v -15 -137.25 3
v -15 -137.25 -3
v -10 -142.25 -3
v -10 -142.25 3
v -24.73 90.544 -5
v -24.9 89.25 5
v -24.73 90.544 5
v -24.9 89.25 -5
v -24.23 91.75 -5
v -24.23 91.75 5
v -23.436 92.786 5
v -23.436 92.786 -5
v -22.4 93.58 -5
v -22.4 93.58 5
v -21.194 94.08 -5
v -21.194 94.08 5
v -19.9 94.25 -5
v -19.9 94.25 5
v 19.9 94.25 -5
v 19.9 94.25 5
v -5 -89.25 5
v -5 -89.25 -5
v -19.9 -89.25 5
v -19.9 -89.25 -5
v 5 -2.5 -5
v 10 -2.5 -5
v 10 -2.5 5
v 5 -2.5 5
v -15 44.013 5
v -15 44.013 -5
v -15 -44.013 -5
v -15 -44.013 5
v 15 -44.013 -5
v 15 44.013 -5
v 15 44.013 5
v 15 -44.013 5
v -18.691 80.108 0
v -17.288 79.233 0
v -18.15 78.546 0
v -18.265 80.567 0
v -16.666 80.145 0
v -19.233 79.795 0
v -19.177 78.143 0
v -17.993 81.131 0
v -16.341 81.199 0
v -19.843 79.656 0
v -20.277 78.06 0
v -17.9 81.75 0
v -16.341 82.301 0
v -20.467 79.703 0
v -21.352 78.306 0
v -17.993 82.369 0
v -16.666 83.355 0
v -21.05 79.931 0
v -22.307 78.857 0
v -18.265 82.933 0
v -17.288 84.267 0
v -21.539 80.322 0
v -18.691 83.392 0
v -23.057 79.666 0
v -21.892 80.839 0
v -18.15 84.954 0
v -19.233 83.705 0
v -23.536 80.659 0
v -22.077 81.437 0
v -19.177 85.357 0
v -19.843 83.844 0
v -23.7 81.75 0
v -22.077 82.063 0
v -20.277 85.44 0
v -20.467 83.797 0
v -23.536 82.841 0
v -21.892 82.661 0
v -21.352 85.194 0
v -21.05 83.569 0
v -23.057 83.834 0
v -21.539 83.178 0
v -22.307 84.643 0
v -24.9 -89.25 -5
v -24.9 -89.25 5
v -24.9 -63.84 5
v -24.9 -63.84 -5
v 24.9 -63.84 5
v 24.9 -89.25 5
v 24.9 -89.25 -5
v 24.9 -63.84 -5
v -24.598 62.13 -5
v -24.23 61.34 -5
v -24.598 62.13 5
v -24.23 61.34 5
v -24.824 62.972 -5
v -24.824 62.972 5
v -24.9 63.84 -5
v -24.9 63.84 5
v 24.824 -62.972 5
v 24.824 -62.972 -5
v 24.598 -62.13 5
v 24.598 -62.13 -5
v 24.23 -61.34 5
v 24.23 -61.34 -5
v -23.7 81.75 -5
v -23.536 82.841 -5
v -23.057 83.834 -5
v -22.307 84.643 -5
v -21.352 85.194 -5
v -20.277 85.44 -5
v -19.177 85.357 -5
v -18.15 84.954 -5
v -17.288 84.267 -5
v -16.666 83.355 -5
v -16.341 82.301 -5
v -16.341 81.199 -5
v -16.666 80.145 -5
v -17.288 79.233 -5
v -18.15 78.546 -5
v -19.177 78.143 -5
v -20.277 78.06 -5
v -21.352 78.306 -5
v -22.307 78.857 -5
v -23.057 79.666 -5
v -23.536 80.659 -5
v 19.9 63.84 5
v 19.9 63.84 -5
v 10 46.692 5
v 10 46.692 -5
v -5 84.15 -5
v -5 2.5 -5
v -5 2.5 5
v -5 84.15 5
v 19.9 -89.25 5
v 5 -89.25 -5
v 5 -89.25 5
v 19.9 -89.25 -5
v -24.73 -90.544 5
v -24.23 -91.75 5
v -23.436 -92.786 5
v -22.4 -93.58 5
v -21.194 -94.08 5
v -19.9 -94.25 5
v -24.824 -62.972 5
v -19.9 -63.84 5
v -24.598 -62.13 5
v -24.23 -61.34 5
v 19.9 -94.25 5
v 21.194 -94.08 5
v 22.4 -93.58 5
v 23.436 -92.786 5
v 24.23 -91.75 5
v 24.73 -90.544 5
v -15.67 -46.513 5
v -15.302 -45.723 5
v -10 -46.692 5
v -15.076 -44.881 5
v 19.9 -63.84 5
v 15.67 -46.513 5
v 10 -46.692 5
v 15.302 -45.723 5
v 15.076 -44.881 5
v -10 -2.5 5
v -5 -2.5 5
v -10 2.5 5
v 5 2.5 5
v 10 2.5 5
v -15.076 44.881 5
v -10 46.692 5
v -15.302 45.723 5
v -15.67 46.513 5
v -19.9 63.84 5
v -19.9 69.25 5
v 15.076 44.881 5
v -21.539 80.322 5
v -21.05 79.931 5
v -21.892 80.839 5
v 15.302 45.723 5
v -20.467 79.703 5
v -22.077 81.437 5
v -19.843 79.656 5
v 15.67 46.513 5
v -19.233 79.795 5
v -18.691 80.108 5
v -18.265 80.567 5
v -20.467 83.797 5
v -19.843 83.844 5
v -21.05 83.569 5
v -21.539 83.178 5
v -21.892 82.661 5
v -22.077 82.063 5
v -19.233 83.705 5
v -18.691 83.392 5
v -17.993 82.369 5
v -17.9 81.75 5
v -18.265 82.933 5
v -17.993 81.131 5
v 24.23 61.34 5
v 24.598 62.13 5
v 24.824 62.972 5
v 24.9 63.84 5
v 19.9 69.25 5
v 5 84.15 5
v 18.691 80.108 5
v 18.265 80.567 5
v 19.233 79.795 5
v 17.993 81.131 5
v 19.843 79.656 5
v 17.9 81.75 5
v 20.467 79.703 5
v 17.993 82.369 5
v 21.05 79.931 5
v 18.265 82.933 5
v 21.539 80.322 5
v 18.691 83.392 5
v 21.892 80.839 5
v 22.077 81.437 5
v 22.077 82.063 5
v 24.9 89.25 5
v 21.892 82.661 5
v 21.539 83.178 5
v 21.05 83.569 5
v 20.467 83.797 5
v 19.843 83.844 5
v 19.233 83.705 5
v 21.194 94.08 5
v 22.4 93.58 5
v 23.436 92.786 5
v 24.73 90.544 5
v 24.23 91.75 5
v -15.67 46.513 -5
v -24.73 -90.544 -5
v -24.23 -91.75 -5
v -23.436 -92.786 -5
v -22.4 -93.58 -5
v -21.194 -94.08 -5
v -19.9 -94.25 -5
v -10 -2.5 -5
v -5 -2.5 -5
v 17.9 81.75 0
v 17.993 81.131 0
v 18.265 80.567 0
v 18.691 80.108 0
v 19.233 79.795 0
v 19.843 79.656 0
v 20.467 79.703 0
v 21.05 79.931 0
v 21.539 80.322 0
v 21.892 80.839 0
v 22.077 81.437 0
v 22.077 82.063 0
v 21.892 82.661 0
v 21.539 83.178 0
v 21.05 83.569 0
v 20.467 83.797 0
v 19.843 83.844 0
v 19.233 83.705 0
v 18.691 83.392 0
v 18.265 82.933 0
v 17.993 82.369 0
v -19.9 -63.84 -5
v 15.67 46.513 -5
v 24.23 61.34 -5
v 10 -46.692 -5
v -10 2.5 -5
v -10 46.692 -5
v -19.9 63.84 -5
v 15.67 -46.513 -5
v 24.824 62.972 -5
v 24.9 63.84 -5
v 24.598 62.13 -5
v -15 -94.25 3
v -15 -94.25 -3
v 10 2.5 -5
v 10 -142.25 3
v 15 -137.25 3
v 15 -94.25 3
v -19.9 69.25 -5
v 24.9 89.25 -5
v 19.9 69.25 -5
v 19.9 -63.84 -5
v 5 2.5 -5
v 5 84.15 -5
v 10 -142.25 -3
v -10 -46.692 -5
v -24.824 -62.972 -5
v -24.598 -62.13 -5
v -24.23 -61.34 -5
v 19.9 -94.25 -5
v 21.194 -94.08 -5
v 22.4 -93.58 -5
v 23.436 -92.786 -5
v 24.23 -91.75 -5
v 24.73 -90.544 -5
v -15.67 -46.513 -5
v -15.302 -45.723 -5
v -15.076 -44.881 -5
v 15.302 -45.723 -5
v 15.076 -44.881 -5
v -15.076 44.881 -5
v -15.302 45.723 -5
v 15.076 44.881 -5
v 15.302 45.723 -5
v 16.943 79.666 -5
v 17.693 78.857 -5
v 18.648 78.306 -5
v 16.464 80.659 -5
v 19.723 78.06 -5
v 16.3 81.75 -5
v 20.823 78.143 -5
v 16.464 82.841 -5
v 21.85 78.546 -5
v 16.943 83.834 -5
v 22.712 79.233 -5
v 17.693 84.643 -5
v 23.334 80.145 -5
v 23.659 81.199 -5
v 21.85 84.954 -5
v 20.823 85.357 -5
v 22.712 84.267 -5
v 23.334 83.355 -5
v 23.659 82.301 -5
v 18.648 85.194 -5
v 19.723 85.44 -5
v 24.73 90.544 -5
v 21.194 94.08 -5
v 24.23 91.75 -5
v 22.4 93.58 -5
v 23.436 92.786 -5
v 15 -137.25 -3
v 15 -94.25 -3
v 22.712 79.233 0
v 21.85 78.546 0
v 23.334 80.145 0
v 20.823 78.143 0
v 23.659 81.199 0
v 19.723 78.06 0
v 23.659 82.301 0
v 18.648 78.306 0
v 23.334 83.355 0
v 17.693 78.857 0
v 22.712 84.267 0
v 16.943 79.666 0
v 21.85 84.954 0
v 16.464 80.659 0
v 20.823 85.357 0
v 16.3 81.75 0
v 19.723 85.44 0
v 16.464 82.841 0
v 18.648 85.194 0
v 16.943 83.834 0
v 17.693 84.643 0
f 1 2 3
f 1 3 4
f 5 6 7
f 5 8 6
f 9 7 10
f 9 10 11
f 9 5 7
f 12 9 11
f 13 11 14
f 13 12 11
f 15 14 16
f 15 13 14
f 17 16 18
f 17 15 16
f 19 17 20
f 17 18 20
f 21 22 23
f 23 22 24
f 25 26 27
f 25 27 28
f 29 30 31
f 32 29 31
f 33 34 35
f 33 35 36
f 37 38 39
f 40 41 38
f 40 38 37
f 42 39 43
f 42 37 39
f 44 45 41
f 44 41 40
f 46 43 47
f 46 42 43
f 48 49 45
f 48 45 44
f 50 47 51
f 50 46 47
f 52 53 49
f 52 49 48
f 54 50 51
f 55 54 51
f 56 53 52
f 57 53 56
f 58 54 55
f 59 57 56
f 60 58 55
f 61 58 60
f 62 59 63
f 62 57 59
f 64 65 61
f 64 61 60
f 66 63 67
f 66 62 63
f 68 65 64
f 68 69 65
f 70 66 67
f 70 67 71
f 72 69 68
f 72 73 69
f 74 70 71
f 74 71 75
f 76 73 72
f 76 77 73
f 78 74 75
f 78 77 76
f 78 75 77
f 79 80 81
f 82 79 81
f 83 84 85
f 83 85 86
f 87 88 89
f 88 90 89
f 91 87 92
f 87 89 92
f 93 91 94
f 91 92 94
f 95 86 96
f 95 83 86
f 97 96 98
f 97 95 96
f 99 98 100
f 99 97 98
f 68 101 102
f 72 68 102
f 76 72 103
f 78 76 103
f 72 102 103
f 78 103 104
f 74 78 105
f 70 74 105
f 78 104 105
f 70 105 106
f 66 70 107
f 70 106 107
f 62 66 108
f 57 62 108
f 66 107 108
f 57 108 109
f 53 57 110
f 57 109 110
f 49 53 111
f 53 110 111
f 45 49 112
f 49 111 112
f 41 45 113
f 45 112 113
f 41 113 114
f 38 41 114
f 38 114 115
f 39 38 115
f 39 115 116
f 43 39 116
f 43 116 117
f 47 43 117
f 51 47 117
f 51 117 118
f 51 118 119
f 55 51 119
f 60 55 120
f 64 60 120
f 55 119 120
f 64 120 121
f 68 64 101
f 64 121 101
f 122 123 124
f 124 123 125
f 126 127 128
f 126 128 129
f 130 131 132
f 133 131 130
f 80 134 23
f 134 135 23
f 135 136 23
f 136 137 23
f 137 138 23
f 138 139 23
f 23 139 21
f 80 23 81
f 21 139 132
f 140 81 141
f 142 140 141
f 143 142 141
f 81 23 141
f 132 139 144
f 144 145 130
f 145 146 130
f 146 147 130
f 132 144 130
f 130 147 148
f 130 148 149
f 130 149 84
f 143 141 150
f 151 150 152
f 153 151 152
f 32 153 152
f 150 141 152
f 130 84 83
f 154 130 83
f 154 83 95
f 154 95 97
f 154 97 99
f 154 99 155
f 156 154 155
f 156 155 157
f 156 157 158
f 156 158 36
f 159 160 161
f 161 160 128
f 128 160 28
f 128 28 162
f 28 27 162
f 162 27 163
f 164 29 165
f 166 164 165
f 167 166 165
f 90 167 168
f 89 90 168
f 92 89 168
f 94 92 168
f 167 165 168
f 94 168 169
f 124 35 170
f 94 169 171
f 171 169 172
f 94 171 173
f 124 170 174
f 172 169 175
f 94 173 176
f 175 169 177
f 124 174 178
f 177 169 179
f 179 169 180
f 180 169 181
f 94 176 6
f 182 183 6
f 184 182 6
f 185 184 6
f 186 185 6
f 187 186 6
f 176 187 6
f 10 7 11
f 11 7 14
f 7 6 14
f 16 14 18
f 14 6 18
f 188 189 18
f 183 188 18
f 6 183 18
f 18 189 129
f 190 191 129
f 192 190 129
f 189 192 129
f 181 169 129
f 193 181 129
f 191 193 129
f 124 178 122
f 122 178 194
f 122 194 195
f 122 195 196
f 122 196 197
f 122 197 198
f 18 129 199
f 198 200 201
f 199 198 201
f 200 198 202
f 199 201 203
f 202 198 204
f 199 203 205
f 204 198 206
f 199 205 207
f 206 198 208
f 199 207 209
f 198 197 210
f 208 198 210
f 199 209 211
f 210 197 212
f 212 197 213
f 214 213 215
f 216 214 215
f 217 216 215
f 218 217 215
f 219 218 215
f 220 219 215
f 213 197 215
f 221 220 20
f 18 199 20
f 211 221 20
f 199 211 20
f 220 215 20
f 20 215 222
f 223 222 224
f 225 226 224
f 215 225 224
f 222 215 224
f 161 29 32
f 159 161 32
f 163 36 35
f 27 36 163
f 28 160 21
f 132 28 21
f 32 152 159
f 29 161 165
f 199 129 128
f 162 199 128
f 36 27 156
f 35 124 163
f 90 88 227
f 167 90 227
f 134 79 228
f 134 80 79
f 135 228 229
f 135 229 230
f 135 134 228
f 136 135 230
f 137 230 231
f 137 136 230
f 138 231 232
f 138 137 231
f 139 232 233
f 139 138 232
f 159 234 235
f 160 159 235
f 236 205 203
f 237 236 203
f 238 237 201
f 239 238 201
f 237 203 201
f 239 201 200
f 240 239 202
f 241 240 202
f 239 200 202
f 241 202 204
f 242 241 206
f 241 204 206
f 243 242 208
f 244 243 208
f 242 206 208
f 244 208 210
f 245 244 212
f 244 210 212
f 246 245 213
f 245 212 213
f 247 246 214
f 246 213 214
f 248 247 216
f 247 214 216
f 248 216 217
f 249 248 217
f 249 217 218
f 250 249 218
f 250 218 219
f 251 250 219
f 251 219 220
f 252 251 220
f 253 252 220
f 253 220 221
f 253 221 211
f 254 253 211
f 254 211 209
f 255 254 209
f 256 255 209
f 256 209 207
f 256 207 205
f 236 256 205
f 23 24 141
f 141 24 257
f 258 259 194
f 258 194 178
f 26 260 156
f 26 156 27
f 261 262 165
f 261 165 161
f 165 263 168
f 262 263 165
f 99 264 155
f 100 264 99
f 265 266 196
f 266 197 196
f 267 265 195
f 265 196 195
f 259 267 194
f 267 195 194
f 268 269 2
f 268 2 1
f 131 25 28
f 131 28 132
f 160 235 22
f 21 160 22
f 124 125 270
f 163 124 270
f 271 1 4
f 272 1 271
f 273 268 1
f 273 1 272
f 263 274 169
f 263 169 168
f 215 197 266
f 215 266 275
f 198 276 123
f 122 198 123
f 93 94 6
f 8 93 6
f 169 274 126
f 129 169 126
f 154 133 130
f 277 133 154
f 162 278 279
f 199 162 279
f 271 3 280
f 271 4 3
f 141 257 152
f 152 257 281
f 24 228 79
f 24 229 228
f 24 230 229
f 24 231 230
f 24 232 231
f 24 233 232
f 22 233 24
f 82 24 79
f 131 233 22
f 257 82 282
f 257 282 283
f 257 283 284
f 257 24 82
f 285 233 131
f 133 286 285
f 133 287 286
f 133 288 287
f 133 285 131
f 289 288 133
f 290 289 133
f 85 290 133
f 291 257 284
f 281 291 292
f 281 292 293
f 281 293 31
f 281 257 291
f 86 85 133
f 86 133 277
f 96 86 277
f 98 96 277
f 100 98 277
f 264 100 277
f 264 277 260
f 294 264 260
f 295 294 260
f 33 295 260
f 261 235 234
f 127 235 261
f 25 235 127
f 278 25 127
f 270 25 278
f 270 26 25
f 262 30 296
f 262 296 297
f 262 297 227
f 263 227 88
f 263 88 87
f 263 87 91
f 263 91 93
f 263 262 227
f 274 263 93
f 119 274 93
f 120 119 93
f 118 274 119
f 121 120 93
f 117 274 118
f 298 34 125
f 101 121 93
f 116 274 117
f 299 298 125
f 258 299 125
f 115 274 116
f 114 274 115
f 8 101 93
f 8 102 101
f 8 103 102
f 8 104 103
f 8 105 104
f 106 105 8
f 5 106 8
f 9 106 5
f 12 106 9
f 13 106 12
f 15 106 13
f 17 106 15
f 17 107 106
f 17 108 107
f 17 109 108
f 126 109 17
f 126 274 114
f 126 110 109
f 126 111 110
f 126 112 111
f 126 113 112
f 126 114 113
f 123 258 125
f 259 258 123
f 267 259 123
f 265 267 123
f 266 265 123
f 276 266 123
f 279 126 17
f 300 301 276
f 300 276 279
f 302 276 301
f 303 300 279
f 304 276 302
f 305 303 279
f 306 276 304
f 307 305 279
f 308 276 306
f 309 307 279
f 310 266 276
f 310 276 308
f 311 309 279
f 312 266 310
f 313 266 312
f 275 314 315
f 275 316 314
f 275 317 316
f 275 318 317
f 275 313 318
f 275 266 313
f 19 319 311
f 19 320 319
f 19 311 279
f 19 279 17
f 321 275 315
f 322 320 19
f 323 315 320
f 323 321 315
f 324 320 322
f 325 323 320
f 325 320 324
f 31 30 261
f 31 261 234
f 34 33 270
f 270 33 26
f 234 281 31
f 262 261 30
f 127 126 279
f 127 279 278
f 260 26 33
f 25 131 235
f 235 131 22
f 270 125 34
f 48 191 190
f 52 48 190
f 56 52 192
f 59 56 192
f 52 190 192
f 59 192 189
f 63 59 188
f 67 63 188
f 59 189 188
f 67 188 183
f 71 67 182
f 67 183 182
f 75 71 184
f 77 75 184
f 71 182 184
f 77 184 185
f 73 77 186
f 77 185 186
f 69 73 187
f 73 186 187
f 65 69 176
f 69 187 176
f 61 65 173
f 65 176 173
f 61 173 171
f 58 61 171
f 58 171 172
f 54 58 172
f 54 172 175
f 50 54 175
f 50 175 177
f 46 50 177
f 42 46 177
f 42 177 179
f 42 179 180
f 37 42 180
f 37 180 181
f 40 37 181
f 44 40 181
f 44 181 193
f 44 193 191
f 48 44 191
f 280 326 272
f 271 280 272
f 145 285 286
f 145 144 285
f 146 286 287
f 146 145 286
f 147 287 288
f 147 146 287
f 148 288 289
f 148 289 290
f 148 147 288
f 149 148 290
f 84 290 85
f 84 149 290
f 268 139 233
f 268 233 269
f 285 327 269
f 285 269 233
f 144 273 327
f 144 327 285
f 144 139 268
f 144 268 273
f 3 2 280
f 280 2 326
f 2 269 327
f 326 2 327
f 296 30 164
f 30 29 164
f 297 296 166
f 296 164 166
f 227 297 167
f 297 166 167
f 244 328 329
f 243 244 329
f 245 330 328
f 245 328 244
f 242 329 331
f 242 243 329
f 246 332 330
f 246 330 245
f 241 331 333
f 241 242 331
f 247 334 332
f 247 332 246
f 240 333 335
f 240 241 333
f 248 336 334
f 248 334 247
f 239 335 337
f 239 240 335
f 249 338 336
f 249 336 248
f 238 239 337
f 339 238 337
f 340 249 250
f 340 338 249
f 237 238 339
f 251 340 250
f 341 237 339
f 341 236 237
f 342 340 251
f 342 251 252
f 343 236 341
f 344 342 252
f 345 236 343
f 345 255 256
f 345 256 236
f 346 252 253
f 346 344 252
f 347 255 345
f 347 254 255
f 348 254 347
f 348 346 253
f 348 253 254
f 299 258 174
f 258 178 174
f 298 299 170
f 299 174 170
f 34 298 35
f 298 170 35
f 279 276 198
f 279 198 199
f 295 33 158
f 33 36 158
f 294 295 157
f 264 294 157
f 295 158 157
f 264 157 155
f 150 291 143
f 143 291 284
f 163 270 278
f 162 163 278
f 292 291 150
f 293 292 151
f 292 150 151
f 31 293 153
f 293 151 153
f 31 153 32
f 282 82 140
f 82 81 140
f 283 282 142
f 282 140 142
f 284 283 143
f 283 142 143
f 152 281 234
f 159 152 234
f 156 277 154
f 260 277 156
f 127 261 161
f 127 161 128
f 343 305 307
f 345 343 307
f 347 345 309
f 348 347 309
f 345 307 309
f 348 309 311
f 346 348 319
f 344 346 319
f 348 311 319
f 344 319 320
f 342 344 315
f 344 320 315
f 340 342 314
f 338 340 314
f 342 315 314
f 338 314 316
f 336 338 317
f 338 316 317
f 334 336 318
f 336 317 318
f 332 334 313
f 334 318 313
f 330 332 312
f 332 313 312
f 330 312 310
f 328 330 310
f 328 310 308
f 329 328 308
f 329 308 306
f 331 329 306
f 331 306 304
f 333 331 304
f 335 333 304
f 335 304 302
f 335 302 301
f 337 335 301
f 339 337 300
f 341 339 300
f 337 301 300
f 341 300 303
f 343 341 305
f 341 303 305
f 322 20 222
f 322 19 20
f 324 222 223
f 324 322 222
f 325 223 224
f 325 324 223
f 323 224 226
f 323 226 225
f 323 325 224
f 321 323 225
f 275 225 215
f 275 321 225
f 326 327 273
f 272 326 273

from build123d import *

# Parameters (mm, degrees)
SKETCH_1_W          = 49.8
SKETCH_1_H          = 188.5
EXTRUDE_1_DEPTH     = 5
CUT_EXTRUDE_1_DEPTH = 98.995267743
FILLET_1_R          = 5
CUT_EXTRUDE_2_DEPTH = 98.995267743
CHAMFER_2_SIZE      = 20
SKETCH_3_W          = 30
SKETCH_3_H          = 6
EXTRUDE_2_DEPTH     = 48
CHAMFER_3_SIZE      = 5
SKETCH_6_R          = 2.1
CUT_EXTRUDE_6_DEPTH = 145.758669861
SKETCH_7_R          = 3.7
CUT_EXTRUDE_7_DEPTH = 5


with BuildPart() as part:
    # 草图1 → 凸台-拉伸1 (new, symmetric)
    with BuildSketch(Plane.XY):
        Rectangle(SKETCH_1_W, SKETCH_1_H)
    extrude(amount=EXTRUDE_1_DEPTH, both=True)

    # 草图4 → 切除-拉伸1 (cut, through all)
    with BuildSketch(Plane(origin=(0, 0, -5), x_dir=(-1, 0, 0), z_dir=(0, 0, -1))):
        Polygon((-24.9, 62.5), (-15, 45.352697005), (-15, -45.352697005), (-24.9, -62.5), align=None)
        Polygon((24.9, -62.5), (24.9, 62.5), (15, 45.352697005), (15, -45.352697005), align=None)
    extrude(amount=-CUT_EXTRUDE_1_DEPTH, mode=Mode.SUBTRACT)

    # 圆角1
    fillet_1_edges = [part.edges().sort_by_distance(p)[0] for p in [
        (24.9, -62.5, 0),
        (24.9, 62.5, 0),
        (15, 45.352697005, 0),
        (15, -45.352697005, 0),
        (-24.9, -62.5, 0),
        (-15, -45.352697005, 0),
        (-15, 45.352697005, 0),
        (-24.9, 62.5, 0),
        (24.9, -94.25, 0),
        (-24.9, -94.25, 0),
        (-24.9, 94.25, 0),
        (24.9, 94.25, 0),
    ]]
    fillet(fillet_1_edges, radius=FILLET_1_R)

    # 草图5 → 切除-拉伸2 (cut, through all)
    with BuildSketch(Plane(origin=(0, 0, -5), x_dir=(-1, 0, 0), z_dir=(0, 0, -1))):
        Polygon((-19.9, 89.25), (-19.9, 63.839745962), (-10, 46.692442967), (-10, 2.5), (-5, 2.5), (-5, 89.25), align=None)
        Polygon((5, 89.25), (19.9, 89.25), (19.9, 63.839745962), (10, 46.692442967), (10, 2.5), (5, 2.5), align=None)
        Polygon((19.9, -89.25), (19.9, -63.839745962), (10, -46.692442967), (10, -2.5), (5, -2.5), (5, -89.25), align=None)
        Polygon((-5, -89.25), (-19.9, -89.25), (-19.9, -63.839745962), (-10, -46.692442967), (-10, -2.5), (-5, -2.5), align=None)
    extrude(amount=-CUT_EXTRUDE_2_DEPTH, mode=Mode.SUBTRACT)

    # 倒角2
    # the kernel refuses this chamfer: 20 mm, written as the material it adds along each edge
    with BuildSketch(Plane(origin=(-19.9, 89.25, -5), x_dir=(-0.027495876610586317, -0.9996219169112968, 0), z_dir=(0, 0, 1))) as chamfer_2_piece_1:
        Polygon((CHAMFER_2_SIZE * 0.999621916911, CHAMFER_2_SIZE * 0.0274958766106), (-CHAMFER_2_SIZE * 0.0274958766106, CHAMFER_2_SIZE * 0.999621916911), (0, 0), align=None)
    extrude(amount=10)
    with BuildSketch(Plane(origin=(19.9, 89.25, -5), x_dir=(0.027495876610586317, -0.9996219169112968, 0), z_dir=(0, 0, 1))) as chamfer_2_piece_2:
        Polygon((CHAMFER_2_SIZE * 0.999621916911, -CHAMFER_2_SIZE * 0.0274958766106), (-CHAMFER_2_SIZE * 0.0274958766106, -CHAMFER_2_SIZE * 0.999621916911), (0, 0), align=None)
    extrude(amount=10)

    # 草图3 → 凸台-拉伸2 (add)
    with BuildSketch(Plane.XZ.offset(94.25)):
        Rectangle(SKETCH_3_W, SKETCH_3_H)
    extrude(amount=EXTRUDE_2_DEPTH)

    # 倒角3
    chamfer_3_edges = [part.edges().sort_by_distance(p)[0] for p in [
        (15, -142.25, 0),
        (-15, -142.25, 0),
    ]]
    chamfer(chamfer_3_edges, length=CHAMFER_3_SIZE)

    # 草图6 → 切除-拉伸6 (cut, through all)
    with BuildSketch(Plane.XY.offset(5)):
        with Locations((-20, 81.75)):
            Circle(SKETCH_6_R)
        with Locations(Location((20, 81.75, 0), (0, 0, 180))):
            Circle(SKETCH_6_R)
    extrude(amount=-CUT_EXTRUDE_6_DEPTH, mode=Mode.SUBTRACT)

    # 草图7 → 切除-拉伸7 (cut)
    with BuildSketch(Plane(origin=(0, 0, -5), x_dir=(-1, 0, 0), z_dir=(0, 0, -1))):
        with Locations((20, 81.75)):
            Circle(SKETCH_7_R)
        with Locations((-20, 81.75)):
            Circle(SKETCH_7_R)
    extrude(amount=-CUT_EXTRUDE_7_DEPTH, mode=Mode.SUBTRACT)


solid = part.part
